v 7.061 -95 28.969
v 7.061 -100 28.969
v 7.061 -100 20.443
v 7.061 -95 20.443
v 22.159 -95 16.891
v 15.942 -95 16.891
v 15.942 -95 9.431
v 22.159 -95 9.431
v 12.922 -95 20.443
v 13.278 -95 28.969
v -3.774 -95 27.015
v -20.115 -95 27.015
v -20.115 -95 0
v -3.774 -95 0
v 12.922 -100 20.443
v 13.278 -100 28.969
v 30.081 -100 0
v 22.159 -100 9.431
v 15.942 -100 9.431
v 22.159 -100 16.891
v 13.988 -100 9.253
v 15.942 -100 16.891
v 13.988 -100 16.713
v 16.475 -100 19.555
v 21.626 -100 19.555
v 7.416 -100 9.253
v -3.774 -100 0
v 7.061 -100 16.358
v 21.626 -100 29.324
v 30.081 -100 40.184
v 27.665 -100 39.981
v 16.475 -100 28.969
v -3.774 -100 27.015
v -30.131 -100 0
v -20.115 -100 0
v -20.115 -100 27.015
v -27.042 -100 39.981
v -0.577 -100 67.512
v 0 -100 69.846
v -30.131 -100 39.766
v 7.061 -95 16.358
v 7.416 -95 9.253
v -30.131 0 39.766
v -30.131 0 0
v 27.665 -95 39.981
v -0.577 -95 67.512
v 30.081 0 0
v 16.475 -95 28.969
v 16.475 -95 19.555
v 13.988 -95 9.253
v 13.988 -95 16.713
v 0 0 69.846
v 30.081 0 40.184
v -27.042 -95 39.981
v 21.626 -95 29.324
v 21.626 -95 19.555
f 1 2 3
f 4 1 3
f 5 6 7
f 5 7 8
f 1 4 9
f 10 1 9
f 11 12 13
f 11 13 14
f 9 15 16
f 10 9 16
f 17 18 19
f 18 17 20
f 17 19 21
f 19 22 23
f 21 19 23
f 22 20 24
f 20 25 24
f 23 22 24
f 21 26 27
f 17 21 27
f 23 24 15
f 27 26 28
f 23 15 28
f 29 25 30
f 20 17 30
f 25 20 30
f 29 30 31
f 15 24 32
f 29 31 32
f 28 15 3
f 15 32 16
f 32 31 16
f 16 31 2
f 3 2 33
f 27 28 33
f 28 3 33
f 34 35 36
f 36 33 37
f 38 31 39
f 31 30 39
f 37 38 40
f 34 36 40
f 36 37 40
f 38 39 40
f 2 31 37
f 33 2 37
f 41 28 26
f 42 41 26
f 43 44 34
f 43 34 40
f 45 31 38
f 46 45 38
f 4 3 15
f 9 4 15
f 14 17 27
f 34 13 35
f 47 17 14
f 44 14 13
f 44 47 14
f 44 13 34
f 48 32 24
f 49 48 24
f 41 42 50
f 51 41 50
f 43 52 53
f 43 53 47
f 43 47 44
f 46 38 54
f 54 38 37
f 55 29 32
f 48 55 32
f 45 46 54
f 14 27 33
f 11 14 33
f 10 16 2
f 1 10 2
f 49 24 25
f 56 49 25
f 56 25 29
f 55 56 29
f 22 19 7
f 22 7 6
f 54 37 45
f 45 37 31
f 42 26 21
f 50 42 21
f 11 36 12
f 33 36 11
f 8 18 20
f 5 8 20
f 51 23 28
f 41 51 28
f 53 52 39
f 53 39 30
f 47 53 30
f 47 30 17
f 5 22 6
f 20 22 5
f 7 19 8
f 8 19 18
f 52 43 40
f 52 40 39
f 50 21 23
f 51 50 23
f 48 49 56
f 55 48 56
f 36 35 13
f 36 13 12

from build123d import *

# Parameters (mm, degrees)
PAD_DEPTH     = 100
SKETCH002_W   = 16.341032
SKETCH002_H   = 27.015066
SKETCH002_W_2 = 6.216697
SKETCH002_H_2 = 7.460034
POCKET_DEPTH  = 5


with BuildPart() as part:
    # Sketch → Pad (new body)
    with BuildSketch(Plane.XZ):
        Polygon((-30.131472, 0), (-30.131472, 39.766136), (0, 69.846497), (30.080984, 40.183968), (30.080984, 0), align=None)
    extrude(amount=PAD_DEPTH)

    # Sketch002 (on Face7 of Pad) → Pocket (cut)
    with BuildSketch(Plane.XZ.offset(100)):
        with Locations((-11.944406, 13.507533)):
            Rectangle(SKETCH002_W, SKETCH002_H)
        Polygon((-27.042097, 39.981319), (27.664824, 39.981319), (-0.576733, 67.512398), align=None)
        Polygon((7.060923, 28.968885), (7.060923, 20.443129), (12.922381, 20.443129), (13.277617, 28.968885), align=None)
        Polygon((16.474777, 28.968885), (16.474777, 19.555031), (21.625753, 19.555031), (21.625753, 29.324125), align=None)
        Polygon((7.060923, 16.357872), (7.416164, 9.253077), (13.9881, 9.253077), (13.9881, 16.713112), align=None)
        with Locations((19.050264, 13.160713)):
            Rectangle(SKETCH002_W_2, SKETCH002_H_2)
    extrude(amount=-POCKET_DEPTH, mode=Mode.SUBTRACT)


solid = part.part
